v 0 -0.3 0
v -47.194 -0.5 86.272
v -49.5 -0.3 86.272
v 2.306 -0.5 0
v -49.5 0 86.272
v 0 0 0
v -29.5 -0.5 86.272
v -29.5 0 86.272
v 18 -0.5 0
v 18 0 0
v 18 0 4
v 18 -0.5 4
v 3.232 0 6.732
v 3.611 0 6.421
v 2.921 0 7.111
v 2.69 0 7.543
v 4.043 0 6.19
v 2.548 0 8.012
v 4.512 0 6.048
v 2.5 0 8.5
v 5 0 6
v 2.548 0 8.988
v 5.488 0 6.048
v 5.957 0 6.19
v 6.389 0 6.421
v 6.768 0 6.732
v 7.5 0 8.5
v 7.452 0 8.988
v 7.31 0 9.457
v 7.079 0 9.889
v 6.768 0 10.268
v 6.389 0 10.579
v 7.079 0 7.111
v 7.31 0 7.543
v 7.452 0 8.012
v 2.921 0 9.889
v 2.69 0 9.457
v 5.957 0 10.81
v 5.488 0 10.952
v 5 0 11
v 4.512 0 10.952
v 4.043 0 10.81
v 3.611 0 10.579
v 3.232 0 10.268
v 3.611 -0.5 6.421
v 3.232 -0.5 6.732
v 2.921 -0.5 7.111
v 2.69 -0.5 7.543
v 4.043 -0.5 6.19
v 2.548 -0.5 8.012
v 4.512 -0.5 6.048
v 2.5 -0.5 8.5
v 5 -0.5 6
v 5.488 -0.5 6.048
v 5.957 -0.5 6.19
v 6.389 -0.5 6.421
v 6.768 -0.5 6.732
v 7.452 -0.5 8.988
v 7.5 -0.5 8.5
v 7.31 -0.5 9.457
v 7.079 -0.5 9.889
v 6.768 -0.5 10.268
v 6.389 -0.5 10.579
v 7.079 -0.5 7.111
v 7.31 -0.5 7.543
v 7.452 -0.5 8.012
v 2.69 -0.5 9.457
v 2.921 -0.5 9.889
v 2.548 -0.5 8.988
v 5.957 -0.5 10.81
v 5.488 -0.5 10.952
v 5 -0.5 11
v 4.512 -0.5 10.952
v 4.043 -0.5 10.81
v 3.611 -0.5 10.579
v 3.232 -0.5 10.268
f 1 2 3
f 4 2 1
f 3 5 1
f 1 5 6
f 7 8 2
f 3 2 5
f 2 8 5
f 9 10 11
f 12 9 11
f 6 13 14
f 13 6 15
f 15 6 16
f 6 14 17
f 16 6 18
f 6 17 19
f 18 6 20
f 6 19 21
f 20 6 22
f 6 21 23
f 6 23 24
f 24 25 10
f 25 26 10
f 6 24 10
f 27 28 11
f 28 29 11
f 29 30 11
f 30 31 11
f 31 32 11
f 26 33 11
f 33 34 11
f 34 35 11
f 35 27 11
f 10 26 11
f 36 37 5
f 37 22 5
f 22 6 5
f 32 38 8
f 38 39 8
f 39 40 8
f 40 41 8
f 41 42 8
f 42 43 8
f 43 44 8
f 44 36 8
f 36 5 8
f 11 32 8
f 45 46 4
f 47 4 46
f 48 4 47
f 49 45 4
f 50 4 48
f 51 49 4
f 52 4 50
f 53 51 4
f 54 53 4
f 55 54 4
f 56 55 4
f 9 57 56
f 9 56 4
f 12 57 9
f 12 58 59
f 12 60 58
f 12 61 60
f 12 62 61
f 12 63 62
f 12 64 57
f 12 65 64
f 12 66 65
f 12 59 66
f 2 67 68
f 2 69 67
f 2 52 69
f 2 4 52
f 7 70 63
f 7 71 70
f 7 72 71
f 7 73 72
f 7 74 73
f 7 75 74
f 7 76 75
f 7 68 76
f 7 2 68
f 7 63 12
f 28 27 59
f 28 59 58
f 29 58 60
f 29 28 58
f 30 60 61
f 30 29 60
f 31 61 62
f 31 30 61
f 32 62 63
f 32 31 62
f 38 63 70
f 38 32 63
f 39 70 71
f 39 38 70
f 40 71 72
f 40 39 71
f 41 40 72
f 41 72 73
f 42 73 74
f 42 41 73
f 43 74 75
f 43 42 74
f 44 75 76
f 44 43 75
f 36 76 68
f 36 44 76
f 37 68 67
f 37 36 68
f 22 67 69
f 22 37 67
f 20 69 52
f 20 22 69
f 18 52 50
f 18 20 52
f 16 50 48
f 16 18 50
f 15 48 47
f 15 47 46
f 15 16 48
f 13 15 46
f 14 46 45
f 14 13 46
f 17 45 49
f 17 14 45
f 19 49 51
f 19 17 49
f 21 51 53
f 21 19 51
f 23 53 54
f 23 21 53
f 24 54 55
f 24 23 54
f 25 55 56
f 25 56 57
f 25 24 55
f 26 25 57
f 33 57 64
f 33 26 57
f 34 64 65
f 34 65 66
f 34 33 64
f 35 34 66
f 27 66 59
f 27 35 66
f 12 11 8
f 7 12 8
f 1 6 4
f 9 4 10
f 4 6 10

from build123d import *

# Parameters (mm, degrees)
SKETCH_R      = 2.5
PAD_DEPTH     = 0.5
CHAMFER_SIZE2 = 2
CHAMFER_SIZE  = 0.2


with BuildPart() as part:
    # Sketch → Pad (new body)
    with BuildSketch(Plane.XZ):
        Polygon((0, 0), (18, 0), (18, 4), (-29.5, 86.272413), (-49.5, 86.272413), align=None)
        with Locations((5, 8.5)):
            Circle(SKETCH_R, mode=Mode.SUBTRACT)
    extrude(amount=PAD_DEPTH)

    # Chamfer
    chamfer_edges = [part.edges().sort_by_distance(p)[0] for p in [
        (-24.75, -0.5, 43.136207),
    ]]
    chamfer_side = part.faces().sort_by_distance((-24.75, -0.25, 43.136207))[0]
    chamfer(chamfer_edges, length=CHAMFER_SIZE, length2=CHAMFER_SIZE2, reference=chamfer_side)


solid = part.part
